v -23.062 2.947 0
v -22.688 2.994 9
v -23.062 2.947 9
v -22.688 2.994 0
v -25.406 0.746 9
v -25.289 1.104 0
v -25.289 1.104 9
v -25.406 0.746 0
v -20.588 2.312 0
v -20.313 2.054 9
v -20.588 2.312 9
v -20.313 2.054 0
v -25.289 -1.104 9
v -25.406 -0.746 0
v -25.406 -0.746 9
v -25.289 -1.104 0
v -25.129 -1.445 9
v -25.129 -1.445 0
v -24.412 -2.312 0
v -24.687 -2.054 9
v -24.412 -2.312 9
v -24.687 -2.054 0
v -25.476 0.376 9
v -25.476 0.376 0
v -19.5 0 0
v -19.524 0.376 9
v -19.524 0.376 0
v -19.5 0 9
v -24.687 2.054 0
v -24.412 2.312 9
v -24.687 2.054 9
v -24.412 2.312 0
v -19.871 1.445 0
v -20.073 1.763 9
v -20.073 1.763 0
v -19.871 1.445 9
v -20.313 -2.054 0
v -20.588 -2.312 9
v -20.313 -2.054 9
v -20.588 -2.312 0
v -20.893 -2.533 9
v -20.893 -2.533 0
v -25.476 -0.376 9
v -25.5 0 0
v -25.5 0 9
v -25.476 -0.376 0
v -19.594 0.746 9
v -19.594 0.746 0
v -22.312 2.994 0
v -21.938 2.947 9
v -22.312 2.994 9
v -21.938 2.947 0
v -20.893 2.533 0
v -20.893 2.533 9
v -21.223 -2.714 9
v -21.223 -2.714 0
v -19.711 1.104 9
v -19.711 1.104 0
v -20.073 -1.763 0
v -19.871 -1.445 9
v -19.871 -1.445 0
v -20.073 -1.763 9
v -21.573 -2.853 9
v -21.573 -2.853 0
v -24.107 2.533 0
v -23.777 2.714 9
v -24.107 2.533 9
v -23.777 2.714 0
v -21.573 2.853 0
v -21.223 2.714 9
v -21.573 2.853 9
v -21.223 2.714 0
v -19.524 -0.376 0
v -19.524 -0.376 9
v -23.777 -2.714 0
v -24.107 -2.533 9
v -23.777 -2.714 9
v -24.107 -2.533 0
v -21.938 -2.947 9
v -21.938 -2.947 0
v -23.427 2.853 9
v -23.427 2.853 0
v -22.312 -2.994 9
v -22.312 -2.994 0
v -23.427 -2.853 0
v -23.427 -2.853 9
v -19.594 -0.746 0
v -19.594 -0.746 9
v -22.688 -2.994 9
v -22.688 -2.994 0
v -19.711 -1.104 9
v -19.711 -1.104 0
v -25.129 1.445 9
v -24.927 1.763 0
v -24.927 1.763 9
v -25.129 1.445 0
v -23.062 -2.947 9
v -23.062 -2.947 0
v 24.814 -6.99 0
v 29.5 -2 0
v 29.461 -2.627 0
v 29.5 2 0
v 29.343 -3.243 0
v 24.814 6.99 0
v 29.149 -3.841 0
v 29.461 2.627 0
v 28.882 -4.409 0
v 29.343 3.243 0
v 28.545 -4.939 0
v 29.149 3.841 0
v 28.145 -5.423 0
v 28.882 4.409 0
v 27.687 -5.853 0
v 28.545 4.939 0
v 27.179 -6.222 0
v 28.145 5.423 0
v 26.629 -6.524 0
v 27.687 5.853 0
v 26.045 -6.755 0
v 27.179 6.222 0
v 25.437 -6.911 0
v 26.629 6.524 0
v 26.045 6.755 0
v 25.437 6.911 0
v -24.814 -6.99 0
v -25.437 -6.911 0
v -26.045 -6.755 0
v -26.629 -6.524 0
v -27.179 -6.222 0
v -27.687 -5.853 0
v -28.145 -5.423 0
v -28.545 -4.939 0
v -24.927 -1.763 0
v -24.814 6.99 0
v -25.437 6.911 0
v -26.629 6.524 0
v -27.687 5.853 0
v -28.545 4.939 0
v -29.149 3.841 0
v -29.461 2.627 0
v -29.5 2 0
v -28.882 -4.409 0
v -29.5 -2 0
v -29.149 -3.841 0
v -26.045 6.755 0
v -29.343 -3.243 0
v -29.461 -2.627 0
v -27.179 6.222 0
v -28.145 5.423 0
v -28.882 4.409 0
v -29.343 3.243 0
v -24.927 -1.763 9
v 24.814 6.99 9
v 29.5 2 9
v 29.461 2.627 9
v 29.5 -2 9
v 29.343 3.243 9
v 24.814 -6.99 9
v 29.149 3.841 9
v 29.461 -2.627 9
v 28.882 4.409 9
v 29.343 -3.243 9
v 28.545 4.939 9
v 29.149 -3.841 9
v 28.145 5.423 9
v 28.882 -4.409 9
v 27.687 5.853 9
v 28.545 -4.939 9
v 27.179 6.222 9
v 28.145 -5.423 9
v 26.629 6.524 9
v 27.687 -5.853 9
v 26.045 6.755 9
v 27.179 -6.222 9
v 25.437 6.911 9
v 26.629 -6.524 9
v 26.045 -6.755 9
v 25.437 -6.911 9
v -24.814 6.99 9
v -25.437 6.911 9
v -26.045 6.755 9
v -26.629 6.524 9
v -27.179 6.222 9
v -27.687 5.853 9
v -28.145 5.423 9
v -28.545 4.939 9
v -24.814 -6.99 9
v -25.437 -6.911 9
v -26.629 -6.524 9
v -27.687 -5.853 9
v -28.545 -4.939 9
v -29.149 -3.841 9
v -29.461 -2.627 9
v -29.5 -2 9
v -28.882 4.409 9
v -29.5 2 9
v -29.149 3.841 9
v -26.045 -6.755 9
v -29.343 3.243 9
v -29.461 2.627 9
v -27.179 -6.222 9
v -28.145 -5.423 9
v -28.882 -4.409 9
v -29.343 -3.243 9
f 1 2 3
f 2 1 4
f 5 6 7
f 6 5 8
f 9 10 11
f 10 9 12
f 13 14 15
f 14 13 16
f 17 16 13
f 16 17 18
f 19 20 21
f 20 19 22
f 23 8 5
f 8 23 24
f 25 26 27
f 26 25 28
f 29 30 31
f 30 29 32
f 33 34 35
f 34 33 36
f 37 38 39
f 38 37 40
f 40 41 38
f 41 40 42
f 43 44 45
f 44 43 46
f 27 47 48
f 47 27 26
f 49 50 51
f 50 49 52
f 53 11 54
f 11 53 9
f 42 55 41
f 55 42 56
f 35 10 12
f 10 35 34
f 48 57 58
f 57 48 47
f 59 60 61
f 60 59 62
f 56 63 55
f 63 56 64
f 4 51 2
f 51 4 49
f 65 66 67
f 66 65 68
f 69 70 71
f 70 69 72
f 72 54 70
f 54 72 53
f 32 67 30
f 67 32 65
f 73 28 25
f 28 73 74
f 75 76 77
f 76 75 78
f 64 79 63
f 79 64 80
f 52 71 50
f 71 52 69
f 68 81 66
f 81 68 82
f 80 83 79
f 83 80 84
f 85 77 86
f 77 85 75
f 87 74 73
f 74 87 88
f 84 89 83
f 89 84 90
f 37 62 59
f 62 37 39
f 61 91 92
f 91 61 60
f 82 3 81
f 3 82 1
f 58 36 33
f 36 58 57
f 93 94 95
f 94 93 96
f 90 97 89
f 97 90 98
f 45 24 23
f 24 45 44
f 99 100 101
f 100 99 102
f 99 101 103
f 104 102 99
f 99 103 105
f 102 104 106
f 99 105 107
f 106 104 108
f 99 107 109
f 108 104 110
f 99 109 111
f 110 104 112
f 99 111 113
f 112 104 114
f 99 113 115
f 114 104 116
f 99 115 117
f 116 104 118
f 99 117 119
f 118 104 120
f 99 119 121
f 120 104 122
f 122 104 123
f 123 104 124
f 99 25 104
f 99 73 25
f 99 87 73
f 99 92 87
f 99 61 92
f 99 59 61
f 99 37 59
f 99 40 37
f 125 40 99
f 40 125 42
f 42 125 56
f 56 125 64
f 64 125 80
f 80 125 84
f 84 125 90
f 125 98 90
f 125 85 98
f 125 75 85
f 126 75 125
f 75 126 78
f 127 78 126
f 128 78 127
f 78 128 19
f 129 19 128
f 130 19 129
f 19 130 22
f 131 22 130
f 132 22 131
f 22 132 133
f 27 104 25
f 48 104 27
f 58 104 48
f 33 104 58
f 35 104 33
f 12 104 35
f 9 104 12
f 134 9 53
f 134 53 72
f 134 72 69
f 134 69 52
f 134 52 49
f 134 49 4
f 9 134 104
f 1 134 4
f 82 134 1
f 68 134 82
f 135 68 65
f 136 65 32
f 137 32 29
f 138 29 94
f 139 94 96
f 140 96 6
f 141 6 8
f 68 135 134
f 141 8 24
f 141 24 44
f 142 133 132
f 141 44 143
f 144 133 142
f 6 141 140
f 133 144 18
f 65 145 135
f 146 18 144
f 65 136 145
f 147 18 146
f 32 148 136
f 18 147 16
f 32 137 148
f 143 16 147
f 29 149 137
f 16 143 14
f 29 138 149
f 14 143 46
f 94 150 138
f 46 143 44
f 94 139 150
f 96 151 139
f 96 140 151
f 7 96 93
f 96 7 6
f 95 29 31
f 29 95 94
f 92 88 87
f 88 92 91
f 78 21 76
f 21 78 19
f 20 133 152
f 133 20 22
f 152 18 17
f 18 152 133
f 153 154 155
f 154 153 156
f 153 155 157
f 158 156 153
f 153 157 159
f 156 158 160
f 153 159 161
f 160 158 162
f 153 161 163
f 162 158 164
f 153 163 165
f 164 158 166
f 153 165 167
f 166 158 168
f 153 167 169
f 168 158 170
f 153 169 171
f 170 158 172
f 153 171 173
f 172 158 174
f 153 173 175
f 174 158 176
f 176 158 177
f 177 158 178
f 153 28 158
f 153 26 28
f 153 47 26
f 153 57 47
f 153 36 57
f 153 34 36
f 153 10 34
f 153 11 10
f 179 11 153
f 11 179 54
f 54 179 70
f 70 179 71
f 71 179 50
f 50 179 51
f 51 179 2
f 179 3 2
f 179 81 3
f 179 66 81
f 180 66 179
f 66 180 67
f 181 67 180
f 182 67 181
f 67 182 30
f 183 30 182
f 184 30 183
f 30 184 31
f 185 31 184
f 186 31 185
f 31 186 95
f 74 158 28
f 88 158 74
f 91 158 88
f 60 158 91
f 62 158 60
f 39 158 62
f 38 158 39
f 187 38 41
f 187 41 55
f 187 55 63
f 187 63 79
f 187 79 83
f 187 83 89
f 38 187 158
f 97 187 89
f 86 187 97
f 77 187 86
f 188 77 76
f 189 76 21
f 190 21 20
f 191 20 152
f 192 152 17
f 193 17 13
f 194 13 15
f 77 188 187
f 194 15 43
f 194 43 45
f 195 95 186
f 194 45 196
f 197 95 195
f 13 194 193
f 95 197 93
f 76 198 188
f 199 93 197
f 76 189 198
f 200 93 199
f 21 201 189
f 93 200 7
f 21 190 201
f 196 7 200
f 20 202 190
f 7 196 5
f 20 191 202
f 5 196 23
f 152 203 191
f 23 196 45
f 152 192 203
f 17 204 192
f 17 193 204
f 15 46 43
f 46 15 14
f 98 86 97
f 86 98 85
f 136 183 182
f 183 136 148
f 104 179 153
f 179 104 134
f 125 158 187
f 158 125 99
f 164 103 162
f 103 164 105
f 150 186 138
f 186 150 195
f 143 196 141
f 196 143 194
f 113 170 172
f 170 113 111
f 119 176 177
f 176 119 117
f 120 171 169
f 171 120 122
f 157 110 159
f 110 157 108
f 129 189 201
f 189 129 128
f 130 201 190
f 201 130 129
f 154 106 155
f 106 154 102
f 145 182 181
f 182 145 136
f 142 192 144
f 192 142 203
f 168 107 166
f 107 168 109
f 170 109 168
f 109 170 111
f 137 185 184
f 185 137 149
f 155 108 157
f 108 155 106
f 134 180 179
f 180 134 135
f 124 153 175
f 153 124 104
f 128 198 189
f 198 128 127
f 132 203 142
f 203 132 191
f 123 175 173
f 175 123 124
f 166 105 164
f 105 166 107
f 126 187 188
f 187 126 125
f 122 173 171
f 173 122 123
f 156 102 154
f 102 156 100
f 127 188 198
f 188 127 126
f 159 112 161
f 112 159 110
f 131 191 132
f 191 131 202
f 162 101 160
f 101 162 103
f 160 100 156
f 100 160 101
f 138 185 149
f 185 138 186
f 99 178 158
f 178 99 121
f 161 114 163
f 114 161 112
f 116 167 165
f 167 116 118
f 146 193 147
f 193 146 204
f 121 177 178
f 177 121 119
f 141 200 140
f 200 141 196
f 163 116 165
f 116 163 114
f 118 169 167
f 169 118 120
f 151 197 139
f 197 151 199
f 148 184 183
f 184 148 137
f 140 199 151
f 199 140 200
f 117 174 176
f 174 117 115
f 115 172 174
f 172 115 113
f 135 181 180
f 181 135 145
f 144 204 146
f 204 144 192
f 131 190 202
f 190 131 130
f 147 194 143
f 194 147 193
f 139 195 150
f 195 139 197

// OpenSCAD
$fn = 50;


difference() {
	union() {
		hull() {
			translate(v = [-24.5000000000, 2.0000000000, 0]) {
				cylinder(h = 9, r = 5);
			}
			translate(v = [24.5000000000, 2.0000000000, 0]) {
				cylinder(h = 9, r = 5);
			}
			translate(v = [-24.5000000000, -2.0000000000, 0]) {
				cylinder(h = 9, r = 5);
			}
			translate(v = [24.5000000000, -2.0000000000, 0]) {
				cylinder(h = 9, r = 5);
			}
		}
	}
	union() {
		translate(v = [-22.5000000000, 0.0000000000, 0]) {
			cylinder(h = 9, r = 3.0000000000);
		}
		translate(v = [-22.5000000000, 0.0000000000, 0]) {
			cylinder(h = 9, r = 1.5000000000);
		}
		translate(v = [-22.5000000000, 0.0000000000, 0]) {
			cylinder(h = 9, r = 1.5000000000);
		}
		translate(v = [-22.5000000000, 0.0000000000, 0]) {
			cylinder(h = 9, r = 1.5000000000);
		}
	}
}
